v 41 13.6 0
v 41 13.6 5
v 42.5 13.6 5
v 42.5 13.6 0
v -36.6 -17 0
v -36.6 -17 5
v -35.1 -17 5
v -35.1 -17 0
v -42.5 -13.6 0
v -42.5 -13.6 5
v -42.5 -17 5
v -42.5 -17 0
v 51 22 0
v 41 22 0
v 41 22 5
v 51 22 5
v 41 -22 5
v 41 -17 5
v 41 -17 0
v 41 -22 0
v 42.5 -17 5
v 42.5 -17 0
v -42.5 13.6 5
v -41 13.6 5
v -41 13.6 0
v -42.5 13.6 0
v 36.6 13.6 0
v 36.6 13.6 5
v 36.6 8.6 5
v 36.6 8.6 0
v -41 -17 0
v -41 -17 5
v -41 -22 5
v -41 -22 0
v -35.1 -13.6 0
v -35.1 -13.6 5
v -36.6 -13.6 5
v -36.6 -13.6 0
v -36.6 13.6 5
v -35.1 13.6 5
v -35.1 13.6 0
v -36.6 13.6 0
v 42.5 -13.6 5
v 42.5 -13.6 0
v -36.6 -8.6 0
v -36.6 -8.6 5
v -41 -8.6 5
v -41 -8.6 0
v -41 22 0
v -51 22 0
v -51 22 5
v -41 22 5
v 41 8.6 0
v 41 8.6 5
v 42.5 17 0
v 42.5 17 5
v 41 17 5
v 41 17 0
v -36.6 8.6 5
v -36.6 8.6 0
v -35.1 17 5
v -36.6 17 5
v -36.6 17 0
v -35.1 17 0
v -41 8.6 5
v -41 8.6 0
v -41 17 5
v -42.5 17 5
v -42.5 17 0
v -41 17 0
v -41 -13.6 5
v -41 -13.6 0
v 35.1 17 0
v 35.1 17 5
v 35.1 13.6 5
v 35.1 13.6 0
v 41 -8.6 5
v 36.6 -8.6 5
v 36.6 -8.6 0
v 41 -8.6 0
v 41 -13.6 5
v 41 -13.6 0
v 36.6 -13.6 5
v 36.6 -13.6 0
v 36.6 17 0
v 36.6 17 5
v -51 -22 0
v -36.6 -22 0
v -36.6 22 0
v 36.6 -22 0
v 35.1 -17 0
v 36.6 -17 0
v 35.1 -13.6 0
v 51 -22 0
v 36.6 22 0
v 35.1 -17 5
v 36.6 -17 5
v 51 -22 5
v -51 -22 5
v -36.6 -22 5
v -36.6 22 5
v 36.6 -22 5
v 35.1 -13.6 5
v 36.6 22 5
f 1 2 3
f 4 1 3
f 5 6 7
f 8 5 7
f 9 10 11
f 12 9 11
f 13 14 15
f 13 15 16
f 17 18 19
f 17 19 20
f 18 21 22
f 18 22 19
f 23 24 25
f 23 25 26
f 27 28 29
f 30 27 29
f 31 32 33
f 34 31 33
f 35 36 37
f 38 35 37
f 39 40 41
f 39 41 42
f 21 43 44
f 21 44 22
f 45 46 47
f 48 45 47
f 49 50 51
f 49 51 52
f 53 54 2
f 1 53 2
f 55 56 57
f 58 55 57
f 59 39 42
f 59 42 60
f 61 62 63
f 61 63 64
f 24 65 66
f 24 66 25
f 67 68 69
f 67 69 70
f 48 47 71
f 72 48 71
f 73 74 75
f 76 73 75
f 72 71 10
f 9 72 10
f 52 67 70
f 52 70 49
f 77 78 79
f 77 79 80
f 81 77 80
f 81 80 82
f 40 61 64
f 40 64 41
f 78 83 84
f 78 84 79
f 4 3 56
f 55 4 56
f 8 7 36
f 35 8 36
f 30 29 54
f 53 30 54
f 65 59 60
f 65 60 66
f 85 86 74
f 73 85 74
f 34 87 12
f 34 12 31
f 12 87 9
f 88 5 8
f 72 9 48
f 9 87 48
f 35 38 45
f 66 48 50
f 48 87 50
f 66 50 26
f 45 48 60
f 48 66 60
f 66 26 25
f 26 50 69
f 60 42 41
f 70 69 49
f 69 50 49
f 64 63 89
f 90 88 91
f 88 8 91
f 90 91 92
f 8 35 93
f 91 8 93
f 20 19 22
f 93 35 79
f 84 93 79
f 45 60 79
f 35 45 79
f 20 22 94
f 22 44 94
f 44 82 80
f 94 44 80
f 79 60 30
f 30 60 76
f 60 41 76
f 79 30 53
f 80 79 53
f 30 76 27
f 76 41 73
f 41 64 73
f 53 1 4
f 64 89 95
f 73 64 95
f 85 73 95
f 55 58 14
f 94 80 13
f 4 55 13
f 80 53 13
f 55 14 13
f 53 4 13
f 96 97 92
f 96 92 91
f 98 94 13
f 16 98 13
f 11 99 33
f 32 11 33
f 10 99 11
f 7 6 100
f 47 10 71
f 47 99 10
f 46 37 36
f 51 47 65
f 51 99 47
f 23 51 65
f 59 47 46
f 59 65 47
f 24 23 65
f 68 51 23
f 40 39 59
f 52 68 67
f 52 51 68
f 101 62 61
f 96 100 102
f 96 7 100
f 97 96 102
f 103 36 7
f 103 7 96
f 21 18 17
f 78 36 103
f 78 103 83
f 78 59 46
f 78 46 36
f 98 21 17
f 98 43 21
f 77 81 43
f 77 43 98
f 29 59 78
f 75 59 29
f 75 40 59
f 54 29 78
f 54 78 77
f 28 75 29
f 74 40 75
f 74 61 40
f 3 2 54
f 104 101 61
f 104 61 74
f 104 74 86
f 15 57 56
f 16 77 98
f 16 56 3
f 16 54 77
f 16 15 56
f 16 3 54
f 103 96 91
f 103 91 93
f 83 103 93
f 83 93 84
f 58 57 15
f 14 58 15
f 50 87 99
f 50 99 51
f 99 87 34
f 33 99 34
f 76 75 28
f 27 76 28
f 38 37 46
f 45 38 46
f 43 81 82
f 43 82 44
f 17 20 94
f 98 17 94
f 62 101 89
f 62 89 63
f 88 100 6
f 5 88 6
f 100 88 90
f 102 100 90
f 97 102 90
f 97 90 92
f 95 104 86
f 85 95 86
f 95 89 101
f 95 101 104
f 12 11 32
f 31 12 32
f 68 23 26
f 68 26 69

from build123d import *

# Parameters (mm, degrees)
SKETCH1_W           = 102
SKETCH1_H           = 44
BOSS_EXTRUDE1_DEPTH = 5
CUT_EXTRUDE1_DEPTH  = 5


with BuildPart() as part:
    # Sketch1 → Boss-Extrude1 (new body)
    with BuildSketch(Plane.XY):
        Rectangle(SKETCH1_W, SKETCH1_H)
    extrude(amount=BOSS_EXTRUDE1_DEPTH)

    # Sketch3 → Cut-Extrude1 (cut)
    with BuildSketch(Plane.XY.offset(5)):
        Polygon((-36.6, 13.6), (-36.6, 8.6), (-41, 8.6), (-41, 13.6), (-42.5, 13.6), (-42.5, 17), (-41, 17), (-41, 22), (-36.6, 22), (-36.6, 17), (-35.1, 17), (-35.1, 13.6), align=None)
        Polygon((41, 8.6), (41, 13.6), (42.5, 13.6), (42.5, 17), (41, 17), (41, 22), (36.6, 22), (36.6, 17), (35.1, 17), (35.1, 13.6), (36.6, 13.6), (36.6, 8.6), align=None)
        Polygon((36.6, -13.6), (36.6, -8.6), (41, -8.6), (41, -13.6), (42.5, -13.6), (42.5, -17), (41, -17), (41, -22), (36.6, -22), (36.6, -17), (35.1, -17), (35.1, -13.6), align=None)
        Polygon((-41, -8.6), (-41, -13.6), (-42.5, -13.6), (-42.5, -17), (-41, -17), (-41, -22), (-36.6, -22), (-36.6, -17), (-35.1, -17), (-35.1, -13.6), (-36.6, -13.6), (-36.6, -8.6), align=None)
    extrude(amount=-CUT_EXTRUDE1_DEPTH, mode=Mode.SUBTRACT)


solid = part.part
